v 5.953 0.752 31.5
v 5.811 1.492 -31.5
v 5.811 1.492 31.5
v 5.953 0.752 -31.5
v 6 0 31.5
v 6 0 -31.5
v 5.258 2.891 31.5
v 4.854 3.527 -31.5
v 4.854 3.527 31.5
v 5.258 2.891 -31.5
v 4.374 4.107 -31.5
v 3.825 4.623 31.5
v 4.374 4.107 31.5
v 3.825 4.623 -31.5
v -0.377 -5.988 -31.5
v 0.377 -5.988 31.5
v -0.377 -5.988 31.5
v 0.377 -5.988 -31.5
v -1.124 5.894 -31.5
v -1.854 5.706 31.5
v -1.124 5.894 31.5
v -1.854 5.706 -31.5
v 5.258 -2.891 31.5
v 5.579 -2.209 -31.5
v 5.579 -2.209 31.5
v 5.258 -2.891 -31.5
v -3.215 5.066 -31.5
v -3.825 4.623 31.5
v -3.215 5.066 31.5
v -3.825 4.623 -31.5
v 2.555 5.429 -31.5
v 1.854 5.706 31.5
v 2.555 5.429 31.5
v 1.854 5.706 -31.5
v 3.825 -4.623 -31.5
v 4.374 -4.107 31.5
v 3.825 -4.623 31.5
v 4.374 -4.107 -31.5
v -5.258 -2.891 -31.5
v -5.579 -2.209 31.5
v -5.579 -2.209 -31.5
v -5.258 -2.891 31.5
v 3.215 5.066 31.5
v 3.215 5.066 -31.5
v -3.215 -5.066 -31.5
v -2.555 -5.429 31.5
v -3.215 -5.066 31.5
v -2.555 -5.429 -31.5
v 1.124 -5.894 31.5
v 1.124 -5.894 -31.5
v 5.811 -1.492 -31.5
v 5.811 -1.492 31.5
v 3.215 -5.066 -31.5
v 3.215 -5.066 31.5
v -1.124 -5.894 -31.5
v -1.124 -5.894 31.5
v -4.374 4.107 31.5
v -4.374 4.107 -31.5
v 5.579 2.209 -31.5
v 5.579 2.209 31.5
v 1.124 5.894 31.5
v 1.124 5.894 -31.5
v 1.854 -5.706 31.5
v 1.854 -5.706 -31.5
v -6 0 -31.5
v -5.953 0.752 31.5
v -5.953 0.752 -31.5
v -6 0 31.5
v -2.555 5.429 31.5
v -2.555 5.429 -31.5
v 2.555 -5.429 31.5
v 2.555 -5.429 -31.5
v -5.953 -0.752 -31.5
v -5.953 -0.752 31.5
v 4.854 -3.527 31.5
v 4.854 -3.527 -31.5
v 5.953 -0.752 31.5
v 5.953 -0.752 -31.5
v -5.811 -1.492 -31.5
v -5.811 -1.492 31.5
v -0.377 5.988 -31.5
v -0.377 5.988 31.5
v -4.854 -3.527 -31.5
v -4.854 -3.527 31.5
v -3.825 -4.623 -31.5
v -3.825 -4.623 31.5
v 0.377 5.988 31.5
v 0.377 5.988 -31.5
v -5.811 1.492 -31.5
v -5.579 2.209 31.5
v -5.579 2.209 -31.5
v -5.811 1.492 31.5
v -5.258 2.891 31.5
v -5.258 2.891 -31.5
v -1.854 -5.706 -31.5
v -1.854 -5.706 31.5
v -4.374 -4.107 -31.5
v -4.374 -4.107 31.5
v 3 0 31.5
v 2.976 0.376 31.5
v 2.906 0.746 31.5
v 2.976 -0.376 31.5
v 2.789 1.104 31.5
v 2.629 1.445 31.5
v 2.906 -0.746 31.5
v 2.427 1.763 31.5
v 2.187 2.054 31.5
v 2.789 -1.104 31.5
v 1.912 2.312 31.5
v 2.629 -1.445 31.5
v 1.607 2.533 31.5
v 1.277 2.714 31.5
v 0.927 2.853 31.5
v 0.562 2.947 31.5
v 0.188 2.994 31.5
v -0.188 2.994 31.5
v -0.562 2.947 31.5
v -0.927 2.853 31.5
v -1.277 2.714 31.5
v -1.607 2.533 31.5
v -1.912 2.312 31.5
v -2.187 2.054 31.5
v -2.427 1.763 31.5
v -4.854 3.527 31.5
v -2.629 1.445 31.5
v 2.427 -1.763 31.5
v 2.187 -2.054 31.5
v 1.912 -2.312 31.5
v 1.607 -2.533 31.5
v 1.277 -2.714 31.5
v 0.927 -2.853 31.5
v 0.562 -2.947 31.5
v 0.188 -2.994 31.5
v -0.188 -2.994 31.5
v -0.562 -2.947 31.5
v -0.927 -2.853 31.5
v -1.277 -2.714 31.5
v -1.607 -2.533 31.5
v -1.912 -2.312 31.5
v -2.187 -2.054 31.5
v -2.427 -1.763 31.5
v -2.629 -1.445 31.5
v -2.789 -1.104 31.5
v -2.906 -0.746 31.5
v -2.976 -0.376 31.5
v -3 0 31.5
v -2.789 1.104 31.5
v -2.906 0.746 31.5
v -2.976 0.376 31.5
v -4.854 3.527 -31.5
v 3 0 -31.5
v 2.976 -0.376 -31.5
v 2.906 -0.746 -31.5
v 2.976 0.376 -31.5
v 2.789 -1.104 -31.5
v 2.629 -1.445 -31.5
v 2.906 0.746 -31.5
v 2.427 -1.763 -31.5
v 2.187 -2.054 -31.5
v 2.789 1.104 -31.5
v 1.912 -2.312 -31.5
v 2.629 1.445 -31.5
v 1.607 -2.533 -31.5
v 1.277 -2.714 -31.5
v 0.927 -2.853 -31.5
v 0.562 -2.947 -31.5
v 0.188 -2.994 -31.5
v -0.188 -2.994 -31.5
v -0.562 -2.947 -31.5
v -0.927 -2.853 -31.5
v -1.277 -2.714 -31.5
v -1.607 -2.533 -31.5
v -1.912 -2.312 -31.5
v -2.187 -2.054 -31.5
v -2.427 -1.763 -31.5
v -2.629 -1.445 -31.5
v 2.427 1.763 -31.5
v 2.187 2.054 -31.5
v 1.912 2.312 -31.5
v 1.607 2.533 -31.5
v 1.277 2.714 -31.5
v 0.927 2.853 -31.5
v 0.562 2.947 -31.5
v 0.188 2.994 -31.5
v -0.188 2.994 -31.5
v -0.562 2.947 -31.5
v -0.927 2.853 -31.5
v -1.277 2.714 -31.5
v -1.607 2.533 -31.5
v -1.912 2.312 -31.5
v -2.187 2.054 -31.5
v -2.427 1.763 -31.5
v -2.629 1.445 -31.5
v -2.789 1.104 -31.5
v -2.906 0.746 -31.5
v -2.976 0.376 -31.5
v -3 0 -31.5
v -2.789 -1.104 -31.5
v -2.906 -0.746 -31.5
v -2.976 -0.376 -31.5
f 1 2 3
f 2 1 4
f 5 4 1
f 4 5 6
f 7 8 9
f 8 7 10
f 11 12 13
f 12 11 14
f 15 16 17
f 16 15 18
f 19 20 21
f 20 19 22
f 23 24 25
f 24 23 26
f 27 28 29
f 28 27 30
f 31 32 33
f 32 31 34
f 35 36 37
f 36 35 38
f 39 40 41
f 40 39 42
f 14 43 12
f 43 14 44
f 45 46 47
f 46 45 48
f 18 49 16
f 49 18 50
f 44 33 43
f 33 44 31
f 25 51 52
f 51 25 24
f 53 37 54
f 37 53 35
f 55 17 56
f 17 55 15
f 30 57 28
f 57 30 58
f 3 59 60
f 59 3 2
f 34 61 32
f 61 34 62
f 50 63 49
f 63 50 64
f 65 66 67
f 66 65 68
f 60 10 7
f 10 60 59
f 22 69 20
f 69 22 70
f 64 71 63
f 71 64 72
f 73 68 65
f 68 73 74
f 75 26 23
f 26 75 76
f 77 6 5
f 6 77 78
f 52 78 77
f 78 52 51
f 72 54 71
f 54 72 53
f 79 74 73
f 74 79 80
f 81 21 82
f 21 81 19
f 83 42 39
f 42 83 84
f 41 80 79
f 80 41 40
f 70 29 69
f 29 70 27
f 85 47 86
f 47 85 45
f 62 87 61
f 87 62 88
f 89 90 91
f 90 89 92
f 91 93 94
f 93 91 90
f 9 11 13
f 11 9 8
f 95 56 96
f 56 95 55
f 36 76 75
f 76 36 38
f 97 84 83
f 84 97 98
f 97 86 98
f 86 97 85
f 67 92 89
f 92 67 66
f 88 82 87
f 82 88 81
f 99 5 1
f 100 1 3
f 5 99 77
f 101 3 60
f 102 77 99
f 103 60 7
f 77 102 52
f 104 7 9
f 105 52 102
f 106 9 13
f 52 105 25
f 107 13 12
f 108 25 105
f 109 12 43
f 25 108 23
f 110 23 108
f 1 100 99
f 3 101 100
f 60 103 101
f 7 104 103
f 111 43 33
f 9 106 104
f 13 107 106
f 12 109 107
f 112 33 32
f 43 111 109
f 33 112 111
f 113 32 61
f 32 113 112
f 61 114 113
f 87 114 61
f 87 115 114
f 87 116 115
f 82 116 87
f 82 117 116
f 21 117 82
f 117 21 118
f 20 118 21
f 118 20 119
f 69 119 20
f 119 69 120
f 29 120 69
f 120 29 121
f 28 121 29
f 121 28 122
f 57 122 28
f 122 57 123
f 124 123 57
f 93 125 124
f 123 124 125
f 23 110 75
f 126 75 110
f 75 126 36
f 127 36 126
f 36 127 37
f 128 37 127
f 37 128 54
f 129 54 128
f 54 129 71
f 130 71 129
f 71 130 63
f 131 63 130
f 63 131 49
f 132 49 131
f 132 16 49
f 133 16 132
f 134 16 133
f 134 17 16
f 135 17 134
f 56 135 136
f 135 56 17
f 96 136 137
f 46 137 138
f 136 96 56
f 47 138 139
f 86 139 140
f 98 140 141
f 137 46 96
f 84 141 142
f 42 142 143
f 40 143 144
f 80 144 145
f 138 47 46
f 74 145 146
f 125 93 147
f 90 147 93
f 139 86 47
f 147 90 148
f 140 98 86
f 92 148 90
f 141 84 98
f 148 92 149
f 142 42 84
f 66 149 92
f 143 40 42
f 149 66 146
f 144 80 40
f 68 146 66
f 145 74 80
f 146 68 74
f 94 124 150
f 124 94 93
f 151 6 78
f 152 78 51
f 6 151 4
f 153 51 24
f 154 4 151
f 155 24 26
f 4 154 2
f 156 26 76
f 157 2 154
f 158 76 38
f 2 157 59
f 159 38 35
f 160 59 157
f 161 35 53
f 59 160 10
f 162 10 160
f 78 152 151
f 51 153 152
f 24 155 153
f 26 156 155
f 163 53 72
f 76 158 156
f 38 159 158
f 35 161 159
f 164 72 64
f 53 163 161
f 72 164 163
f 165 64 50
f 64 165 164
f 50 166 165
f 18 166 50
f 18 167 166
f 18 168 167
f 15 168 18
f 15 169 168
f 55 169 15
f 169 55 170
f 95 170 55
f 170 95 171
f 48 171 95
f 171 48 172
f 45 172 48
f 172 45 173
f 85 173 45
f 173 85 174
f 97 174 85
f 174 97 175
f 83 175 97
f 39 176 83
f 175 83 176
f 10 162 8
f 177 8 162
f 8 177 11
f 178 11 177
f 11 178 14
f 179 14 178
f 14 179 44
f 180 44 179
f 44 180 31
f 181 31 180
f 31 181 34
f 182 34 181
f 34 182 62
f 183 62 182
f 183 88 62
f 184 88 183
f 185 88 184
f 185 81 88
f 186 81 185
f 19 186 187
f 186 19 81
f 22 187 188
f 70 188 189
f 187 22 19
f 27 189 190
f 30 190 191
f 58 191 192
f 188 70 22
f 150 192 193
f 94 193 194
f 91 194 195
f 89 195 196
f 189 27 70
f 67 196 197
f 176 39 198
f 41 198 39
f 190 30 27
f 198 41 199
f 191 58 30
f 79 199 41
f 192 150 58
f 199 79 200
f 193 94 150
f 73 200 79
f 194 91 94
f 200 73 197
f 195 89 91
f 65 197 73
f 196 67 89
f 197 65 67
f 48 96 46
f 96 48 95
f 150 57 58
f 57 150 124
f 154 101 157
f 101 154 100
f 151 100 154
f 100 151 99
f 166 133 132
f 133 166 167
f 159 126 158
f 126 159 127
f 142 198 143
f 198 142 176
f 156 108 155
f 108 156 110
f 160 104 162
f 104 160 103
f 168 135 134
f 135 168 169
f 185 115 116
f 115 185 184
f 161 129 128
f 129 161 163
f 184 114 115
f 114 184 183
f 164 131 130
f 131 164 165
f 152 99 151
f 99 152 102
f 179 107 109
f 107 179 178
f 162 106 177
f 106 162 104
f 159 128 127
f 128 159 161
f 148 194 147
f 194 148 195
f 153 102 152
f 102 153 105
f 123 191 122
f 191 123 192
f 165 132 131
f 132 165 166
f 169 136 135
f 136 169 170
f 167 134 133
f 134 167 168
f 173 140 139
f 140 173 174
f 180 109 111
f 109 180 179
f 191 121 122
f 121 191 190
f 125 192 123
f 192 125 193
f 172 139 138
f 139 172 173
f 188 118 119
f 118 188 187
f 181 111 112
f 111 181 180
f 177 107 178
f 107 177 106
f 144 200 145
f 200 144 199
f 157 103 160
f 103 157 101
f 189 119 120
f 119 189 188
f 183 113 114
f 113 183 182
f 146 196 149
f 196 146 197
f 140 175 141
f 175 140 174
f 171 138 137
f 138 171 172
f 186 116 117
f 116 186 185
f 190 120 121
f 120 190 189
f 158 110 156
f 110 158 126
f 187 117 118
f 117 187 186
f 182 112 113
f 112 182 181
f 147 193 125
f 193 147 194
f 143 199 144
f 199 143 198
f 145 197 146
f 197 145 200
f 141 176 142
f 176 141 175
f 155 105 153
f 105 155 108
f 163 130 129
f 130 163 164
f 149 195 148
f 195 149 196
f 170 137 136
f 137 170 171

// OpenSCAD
$fn = 50;


difference() {
	union() {
		translate(v = [0, 0, -31.5000000000]) {
			cylinder(h = 63, r = 6.0000000000);
		}
	}
	union() {
		translate(v = [0, 0, -100.0000000000]) {
			cylinder(h = 200, r = 3.0000000000);
		}
	}
}
